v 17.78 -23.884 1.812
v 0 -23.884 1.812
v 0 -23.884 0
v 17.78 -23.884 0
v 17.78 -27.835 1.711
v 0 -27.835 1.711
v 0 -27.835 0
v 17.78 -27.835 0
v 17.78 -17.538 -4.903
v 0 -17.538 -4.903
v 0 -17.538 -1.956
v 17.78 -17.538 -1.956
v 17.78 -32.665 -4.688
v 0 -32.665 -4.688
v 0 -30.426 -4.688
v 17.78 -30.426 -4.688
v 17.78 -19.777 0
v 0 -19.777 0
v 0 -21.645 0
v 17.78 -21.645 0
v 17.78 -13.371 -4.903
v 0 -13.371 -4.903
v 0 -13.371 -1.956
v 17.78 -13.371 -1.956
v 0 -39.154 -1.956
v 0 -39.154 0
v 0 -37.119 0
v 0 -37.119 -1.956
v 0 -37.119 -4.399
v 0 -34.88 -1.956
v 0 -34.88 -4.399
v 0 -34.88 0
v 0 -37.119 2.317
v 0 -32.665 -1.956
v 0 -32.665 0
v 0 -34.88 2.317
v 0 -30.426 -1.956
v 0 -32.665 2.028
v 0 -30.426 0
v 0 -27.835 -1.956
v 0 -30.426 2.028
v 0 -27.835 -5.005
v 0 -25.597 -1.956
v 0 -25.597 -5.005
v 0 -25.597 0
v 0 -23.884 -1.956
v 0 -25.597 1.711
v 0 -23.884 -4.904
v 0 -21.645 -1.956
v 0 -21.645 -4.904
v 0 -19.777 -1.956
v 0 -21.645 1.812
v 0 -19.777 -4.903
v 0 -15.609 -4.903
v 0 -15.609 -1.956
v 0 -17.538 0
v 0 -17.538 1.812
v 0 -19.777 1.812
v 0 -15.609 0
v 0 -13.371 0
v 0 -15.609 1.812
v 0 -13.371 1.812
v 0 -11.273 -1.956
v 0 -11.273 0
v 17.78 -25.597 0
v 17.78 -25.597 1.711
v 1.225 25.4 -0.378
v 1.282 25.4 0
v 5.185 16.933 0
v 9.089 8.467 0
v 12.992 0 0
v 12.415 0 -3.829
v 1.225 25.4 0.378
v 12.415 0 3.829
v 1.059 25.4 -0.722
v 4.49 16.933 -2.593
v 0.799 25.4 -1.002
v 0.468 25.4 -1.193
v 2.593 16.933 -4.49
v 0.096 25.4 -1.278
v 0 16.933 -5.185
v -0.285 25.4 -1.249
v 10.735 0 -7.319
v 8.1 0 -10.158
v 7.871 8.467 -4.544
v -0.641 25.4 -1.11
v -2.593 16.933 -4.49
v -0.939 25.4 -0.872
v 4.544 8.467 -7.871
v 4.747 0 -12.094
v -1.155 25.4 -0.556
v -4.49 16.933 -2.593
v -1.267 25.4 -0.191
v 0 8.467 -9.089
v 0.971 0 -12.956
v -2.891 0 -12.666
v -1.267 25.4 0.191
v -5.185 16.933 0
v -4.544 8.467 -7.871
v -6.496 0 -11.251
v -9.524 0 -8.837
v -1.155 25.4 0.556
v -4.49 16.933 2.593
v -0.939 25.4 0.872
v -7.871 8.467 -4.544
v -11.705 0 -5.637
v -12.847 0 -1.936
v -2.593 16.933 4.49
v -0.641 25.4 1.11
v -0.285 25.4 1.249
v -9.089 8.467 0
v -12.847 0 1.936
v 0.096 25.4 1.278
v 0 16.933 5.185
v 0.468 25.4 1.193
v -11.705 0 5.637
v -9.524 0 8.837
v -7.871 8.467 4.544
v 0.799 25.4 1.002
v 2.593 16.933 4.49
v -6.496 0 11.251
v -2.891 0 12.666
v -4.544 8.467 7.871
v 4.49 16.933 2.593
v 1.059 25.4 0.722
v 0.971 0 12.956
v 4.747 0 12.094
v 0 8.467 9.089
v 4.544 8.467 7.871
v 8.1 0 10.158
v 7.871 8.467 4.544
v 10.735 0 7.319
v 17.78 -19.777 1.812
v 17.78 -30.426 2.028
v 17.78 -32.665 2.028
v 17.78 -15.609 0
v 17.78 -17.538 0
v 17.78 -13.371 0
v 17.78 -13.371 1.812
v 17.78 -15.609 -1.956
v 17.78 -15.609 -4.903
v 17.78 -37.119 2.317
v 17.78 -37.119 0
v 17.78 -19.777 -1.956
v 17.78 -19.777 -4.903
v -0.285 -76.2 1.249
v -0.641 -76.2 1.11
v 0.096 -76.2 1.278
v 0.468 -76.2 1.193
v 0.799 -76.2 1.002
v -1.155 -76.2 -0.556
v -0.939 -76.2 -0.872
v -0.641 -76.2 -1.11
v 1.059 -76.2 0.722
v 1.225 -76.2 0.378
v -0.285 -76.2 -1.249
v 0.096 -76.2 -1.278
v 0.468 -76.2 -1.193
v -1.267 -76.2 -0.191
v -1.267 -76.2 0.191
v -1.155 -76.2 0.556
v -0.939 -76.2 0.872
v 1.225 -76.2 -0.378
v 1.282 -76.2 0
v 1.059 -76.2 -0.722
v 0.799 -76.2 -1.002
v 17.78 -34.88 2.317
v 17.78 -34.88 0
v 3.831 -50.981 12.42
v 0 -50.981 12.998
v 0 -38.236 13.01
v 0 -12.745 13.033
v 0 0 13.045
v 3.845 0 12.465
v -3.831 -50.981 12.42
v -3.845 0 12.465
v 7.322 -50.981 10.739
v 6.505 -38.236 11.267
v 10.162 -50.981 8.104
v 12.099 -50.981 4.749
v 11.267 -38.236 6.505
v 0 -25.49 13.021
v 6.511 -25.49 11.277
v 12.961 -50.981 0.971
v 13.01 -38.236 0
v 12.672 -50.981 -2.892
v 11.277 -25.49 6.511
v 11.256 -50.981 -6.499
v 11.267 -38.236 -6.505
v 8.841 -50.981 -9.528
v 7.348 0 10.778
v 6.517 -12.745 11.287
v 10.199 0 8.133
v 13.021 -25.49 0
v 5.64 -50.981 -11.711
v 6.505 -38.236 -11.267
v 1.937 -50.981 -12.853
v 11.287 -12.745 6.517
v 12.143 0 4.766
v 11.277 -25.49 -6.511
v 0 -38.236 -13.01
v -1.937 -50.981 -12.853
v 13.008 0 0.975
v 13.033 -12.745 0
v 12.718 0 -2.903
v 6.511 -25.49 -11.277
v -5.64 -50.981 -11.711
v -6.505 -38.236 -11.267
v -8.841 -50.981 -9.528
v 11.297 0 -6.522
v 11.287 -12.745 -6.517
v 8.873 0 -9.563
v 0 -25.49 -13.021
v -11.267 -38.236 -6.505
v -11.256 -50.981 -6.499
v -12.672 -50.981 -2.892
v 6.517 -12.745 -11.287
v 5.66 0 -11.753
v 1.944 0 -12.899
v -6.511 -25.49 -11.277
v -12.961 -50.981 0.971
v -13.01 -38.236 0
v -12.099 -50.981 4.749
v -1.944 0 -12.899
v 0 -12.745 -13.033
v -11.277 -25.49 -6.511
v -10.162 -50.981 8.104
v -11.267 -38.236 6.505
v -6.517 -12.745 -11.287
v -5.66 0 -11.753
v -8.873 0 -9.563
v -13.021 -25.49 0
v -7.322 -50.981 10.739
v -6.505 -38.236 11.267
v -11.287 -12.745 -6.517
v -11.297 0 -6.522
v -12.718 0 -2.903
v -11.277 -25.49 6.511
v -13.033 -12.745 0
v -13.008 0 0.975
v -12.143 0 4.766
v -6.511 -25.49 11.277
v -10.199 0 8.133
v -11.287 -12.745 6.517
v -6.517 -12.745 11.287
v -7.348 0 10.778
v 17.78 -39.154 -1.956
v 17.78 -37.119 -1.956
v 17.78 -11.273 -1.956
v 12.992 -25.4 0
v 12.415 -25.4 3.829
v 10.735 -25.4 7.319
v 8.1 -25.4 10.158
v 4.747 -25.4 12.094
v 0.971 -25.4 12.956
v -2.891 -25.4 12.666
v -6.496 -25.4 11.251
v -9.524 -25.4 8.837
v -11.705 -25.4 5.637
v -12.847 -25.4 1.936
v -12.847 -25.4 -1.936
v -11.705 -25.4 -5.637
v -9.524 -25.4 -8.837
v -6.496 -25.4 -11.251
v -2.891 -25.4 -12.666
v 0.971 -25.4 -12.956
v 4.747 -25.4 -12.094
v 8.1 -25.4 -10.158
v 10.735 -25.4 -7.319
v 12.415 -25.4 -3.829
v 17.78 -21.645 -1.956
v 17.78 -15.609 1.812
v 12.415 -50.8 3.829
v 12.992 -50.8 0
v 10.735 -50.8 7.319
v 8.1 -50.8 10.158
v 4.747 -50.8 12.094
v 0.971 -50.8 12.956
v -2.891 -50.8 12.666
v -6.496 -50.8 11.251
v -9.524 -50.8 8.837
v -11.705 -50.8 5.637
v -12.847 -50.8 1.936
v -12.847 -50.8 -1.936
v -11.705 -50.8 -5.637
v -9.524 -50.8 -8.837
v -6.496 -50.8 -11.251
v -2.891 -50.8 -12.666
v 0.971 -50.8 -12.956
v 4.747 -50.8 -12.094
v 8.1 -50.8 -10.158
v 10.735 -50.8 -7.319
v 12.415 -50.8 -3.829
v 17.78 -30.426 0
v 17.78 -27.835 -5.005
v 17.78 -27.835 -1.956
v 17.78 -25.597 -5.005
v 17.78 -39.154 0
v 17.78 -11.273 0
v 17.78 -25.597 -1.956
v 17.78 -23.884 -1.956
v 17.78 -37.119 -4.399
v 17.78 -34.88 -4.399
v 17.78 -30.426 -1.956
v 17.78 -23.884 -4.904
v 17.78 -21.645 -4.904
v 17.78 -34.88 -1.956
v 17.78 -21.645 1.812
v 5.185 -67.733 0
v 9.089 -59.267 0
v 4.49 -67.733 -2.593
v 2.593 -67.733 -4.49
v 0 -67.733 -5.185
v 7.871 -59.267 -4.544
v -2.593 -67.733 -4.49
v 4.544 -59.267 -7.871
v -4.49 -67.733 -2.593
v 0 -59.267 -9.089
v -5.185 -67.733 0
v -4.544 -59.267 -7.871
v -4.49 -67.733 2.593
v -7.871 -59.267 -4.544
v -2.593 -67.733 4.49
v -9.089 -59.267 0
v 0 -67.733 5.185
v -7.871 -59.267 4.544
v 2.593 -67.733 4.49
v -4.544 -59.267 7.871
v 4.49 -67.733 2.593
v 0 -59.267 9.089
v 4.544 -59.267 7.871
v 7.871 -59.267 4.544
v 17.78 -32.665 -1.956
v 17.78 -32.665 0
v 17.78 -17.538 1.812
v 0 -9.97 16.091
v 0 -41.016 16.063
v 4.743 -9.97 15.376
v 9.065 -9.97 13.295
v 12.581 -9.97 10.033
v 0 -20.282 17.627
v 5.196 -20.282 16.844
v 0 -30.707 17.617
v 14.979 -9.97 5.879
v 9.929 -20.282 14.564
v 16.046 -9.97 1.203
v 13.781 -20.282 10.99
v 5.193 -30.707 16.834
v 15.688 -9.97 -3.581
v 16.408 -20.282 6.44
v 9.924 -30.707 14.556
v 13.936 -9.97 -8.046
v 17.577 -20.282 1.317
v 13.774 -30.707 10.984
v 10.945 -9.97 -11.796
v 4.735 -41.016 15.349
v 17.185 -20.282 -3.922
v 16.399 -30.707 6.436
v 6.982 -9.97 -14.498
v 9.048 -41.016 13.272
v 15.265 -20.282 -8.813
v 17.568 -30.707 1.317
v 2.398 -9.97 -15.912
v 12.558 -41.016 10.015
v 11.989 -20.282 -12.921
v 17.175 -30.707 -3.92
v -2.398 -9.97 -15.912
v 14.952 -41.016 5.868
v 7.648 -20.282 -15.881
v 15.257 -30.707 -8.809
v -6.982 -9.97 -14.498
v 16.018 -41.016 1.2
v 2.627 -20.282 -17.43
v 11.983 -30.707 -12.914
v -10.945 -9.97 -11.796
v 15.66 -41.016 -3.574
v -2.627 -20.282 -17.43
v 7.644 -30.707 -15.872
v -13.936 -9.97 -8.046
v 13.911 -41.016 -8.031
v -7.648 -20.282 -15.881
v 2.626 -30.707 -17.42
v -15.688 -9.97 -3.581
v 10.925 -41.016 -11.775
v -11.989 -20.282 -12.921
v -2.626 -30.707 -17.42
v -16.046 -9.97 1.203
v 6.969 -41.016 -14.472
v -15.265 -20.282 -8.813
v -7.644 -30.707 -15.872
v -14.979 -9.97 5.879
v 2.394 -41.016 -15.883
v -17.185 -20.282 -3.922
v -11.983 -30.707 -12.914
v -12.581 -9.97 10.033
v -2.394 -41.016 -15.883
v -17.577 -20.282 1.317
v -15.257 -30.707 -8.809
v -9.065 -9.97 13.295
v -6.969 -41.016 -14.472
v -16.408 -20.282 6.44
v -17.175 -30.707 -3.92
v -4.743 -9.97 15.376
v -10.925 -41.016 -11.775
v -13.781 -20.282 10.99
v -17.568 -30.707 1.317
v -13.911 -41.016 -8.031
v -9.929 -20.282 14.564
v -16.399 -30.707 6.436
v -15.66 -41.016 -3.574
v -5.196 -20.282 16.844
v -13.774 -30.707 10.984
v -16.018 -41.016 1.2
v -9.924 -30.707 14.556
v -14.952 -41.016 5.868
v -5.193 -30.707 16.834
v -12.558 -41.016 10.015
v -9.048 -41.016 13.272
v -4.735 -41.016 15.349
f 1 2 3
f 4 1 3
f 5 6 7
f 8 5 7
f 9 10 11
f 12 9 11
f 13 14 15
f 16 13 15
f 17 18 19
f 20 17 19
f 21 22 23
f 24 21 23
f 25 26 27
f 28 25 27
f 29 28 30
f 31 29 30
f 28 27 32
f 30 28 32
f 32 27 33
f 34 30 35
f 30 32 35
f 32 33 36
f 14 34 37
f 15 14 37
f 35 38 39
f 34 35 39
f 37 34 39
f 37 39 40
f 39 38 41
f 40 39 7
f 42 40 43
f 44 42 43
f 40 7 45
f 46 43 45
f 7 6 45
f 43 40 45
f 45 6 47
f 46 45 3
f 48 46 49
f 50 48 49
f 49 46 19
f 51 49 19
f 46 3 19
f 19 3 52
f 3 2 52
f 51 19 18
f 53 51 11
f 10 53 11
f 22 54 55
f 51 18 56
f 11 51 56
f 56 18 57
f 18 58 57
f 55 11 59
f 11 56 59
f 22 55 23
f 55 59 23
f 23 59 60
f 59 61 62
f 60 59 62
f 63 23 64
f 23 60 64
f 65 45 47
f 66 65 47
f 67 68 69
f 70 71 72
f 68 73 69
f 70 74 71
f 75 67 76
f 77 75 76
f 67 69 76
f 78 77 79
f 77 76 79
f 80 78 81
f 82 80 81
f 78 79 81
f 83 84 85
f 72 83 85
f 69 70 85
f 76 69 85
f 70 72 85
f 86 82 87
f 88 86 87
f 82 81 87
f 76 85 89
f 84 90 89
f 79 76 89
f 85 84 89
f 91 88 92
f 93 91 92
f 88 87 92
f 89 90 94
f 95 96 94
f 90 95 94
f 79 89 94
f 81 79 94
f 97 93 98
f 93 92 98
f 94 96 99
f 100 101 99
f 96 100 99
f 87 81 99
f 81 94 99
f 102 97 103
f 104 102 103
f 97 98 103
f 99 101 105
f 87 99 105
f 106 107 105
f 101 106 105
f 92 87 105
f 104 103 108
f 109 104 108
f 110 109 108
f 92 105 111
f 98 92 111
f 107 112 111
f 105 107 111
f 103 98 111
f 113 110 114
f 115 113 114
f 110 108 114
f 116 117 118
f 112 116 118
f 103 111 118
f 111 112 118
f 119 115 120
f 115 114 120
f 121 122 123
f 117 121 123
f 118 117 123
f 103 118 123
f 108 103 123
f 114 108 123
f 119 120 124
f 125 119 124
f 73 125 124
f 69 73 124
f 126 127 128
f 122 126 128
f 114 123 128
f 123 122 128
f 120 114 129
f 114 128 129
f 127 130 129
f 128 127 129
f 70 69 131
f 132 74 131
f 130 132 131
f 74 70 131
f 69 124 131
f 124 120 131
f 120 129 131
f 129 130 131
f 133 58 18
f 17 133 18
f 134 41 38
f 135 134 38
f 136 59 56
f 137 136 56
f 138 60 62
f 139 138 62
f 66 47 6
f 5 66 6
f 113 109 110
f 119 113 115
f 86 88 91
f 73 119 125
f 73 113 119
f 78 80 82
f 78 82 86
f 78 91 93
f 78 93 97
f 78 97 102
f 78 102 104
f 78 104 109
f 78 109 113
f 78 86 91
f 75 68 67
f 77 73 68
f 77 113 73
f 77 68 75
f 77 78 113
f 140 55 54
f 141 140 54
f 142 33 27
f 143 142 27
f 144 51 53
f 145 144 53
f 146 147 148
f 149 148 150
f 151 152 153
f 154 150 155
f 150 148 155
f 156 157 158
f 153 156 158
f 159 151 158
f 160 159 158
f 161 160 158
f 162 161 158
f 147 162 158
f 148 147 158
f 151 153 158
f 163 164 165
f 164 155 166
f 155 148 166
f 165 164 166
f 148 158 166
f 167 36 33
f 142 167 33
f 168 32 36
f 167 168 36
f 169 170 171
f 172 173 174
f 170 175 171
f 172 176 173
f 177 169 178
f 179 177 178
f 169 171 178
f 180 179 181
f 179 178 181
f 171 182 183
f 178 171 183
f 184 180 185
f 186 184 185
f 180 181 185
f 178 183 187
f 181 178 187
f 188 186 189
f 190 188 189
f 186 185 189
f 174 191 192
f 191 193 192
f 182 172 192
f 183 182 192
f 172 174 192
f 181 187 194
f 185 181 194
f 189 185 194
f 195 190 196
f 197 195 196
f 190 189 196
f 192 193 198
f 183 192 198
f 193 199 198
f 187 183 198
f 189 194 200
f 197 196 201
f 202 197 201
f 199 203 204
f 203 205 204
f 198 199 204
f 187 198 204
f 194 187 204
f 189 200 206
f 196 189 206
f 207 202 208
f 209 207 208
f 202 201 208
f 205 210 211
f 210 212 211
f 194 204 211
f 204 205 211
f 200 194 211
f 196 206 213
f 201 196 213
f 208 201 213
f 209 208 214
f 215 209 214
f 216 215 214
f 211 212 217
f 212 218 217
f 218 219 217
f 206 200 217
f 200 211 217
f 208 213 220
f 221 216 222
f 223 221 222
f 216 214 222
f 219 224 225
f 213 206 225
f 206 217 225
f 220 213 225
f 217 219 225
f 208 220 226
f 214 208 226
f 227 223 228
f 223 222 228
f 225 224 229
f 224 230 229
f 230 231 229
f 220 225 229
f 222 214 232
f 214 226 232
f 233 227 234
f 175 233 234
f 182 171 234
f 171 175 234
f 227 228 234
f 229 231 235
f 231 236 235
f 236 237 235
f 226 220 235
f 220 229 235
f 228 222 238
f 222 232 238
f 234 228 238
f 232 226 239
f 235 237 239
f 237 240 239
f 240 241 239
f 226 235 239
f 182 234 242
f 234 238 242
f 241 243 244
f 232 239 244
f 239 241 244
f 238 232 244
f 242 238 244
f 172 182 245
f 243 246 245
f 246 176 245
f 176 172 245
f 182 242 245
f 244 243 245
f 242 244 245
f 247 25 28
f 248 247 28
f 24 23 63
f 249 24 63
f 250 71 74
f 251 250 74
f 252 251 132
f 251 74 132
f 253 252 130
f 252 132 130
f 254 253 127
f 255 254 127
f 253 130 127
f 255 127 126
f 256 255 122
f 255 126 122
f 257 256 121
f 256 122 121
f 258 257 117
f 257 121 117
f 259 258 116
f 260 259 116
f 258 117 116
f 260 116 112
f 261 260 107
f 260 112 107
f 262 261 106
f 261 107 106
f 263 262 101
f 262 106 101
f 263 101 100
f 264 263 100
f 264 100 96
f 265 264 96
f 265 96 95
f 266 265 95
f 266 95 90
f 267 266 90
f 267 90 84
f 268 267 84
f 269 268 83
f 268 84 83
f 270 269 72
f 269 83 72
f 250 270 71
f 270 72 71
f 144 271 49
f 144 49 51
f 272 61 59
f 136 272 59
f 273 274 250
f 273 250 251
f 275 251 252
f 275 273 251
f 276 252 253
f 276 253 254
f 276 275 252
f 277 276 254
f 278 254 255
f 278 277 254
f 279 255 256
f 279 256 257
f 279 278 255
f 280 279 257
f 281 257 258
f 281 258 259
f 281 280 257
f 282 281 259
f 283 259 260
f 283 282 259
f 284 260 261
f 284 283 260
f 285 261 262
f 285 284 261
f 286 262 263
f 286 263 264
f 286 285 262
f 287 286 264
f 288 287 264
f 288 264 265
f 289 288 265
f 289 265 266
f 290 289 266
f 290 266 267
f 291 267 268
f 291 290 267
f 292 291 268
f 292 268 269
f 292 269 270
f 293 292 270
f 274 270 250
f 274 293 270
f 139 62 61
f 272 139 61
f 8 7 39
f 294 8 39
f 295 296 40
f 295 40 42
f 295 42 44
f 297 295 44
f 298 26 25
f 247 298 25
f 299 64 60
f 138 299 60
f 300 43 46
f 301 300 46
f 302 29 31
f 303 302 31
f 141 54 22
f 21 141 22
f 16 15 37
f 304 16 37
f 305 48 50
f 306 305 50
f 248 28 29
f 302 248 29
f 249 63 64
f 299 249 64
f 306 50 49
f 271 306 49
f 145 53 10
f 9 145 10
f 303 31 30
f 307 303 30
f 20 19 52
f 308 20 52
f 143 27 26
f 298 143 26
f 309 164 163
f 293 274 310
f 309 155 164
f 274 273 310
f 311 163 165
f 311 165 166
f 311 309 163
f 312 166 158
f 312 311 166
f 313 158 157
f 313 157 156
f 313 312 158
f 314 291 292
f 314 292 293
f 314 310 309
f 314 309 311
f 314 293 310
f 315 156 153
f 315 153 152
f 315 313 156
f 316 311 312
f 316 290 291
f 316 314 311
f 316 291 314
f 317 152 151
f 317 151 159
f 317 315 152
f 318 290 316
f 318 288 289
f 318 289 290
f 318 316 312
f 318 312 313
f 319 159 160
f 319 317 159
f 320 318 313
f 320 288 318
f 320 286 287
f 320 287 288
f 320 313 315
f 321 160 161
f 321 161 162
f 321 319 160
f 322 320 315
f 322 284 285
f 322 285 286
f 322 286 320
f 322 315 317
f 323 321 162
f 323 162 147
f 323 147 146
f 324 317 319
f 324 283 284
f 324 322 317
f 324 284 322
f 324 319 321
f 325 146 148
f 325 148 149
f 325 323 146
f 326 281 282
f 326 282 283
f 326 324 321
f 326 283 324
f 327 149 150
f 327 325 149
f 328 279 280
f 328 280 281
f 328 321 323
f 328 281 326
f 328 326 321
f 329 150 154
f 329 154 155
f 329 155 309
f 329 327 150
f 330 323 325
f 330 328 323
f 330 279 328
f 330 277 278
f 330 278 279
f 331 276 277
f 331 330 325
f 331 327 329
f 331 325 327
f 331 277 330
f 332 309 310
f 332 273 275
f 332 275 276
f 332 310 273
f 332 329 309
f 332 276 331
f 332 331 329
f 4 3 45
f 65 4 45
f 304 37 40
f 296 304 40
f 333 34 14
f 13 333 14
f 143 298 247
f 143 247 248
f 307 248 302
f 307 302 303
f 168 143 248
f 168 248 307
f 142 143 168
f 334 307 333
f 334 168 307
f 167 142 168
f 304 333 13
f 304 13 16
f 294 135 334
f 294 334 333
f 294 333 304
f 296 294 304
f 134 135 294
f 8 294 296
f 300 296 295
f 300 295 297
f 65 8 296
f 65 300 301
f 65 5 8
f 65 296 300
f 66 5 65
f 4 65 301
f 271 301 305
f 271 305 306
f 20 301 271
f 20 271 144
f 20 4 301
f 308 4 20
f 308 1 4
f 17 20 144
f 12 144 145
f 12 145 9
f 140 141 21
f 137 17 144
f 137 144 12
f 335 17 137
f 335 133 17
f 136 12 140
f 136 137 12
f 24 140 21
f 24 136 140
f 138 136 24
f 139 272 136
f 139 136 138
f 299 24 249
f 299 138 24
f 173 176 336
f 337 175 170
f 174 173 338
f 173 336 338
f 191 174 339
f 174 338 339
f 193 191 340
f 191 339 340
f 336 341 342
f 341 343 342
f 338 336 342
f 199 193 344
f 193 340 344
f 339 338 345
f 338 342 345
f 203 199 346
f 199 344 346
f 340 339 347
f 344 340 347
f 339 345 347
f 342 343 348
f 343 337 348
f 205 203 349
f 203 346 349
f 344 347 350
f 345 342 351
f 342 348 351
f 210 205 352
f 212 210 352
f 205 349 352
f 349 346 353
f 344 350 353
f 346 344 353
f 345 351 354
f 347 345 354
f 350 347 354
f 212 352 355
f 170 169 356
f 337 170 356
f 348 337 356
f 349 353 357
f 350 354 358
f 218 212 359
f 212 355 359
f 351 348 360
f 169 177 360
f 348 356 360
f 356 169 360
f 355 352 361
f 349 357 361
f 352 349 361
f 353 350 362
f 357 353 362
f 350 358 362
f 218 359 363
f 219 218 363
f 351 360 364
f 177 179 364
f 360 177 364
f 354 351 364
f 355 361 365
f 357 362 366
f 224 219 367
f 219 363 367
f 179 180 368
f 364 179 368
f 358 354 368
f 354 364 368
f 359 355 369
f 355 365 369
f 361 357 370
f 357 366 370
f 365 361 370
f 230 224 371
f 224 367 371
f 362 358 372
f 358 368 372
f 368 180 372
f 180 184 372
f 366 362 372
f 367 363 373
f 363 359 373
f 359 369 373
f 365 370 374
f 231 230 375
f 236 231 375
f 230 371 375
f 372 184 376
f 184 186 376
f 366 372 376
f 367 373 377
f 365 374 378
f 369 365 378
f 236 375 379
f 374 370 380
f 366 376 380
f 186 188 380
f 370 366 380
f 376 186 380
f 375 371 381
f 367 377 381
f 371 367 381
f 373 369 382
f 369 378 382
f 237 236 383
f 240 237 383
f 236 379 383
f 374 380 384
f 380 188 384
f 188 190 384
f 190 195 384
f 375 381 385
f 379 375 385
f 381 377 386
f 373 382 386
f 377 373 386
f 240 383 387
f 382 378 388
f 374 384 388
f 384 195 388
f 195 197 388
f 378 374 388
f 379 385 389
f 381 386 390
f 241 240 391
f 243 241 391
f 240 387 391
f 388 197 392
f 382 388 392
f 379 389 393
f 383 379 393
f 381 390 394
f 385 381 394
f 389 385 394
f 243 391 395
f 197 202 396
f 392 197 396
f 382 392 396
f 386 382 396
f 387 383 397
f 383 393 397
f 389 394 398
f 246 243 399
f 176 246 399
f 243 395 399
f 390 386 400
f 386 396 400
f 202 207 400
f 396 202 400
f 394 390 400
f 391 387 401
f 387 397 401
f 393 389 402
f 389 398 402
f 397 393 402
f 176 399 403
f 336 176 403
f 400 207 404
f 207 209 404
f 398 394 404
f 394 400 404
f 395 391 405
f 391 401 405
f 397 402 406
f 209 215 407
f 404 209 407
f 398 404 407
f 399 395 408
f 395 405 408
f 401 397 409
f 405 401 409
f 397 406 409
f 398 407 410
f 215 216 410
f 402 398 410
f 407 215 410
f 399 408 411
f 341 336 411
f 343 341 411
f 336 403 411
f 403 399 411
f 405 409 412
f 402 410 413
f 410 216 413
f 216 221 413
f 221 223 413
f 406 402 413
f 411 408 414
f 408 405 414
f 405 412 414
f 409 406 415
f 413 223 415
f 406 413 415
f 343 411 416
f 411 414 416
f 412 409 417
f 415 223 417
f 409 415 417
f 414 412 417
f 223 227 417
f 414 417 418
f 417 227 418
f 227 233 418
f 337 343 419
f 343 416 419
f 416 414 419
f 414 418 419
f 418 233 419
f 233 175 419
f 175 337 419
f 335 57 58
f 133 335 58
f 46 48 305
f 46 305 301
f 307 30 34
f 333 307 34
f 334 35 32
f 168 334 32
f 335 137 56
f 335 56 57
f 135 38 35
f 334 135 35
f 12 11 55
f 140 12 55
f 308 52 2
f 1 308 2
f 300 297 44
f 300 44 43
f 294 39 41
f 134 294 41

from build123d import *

# Parameters (mm, degrees)
F0_R      = 12.9921
F1_DEPTH  = 25.4
F3_R      = 1.28162
F1_FACE_R = 12.9921
F9_W      = 2.238606
F9_H      = 2.947048
F10_DEPTH = 17.78


with BuildPart() as f1:
    # F0 (on Front) → F1 (new body)
    with BuildSketch(Plane.XZ):
        Circle(F0_R)
    extrude(amount=F1_DEPTH)

    # F3 (on offset) → F4 section 0
    with BuildSketch(Plane(origin=(0, 25.4, 0), x_dir=(1, 0, 0), z_dir=(0, 1, 0))):
        Circle(F3_R)
    # F1_face (on face) → F4 section 1
    with BuildSketch(Plane(origin=(0, 0, 0), x_dir=(1, 0, 0), z_dir=(0, 1, 0))):
        Circle(F1_FACE_R)
    loft()

    # F6: F1 across plane


with BuildPart() as f1_1:
    add(f1.part)
    add(f1.part.mirror(Plane.XZ.offset(25.4)))


with BuildPart() as f8:
    # F7 (on Right) → F8 (revolve)
    with BuildSketch(Plane.YZ):
        with BuildLine():
            Line((-50.980702, 12.997729), (0, 13.044823))
            ThreePointArc((0, 13.044823), (-25.49478, 17.81584), (-50.980702, 12.997729))
        make_face()
    revolve(axis=Axis((0, 0, 0), (0, 1, 0)))


with BuildPart() as f10:
    # F9 (on Right) → F10 (new body)
    with BuildSketch(Plane.YZ):
        Polygon((-37.118651, 0), (-39.153744, 0), (-39.153744, -1.956454), (-37.118651, -1.956454), (-37.118651, -4.398567), (-34.880046, -4.398567), (-34.880046, -1.956454), (-32.664832, -1.956454), (-32.664832, -4.687884), (-30.426227, -4.687884), (-30.426227, -1.956454), (-27.835427, -1.956454), (-27.835427, -5.00524), (-25.596821, -5.00524), (-25.596821, -1.956454), (-23.883699, -1.956454), (-21.645093, -1.956454), (-19.776867, -1.956454), (-19.776867, -4.903491), (-17.538262, -4.903491), (-17.538262, -1.956454), (-15.609282, -1.956454), (-15.609282, -4.90348), (-13.370677, -4.90348), (-13.370677, -1.956454), (-11.272956, -1.956454), (-11.272956, 0), (-13.370677, 0), (-13.370677, 1.812331), (-15.609282, 1.812331), (-15.609282, 0), (-17.538262, 0), (-17.538262, 1.812319), (-19.776867, 1.812319), (-19.776867, 0), (-21.645093, 0), (-21.645093, 1.812308), (-23.883699, 1.812308), (-23.883699, 0), (-25.596821, 0), (-25.596821, 1.710571), (-27.835427, 1.710571), (-27.835427, 0), (-30.426227, 0), (-30.426227, 2.027926), (-32.664832, 2.027926), (-32.664832, 0), (-34.880046, 0), (-34.880046, 2.317243), (-37.118651, 2.317243), align=None)
        with Locations((-22.764396, -3.429978)):
            Rectangle(F9_W, F9_H)
    extrude(amount=F10_DEPTH)


solid = Compound([f1_1.part, f8.part, f10.part])
